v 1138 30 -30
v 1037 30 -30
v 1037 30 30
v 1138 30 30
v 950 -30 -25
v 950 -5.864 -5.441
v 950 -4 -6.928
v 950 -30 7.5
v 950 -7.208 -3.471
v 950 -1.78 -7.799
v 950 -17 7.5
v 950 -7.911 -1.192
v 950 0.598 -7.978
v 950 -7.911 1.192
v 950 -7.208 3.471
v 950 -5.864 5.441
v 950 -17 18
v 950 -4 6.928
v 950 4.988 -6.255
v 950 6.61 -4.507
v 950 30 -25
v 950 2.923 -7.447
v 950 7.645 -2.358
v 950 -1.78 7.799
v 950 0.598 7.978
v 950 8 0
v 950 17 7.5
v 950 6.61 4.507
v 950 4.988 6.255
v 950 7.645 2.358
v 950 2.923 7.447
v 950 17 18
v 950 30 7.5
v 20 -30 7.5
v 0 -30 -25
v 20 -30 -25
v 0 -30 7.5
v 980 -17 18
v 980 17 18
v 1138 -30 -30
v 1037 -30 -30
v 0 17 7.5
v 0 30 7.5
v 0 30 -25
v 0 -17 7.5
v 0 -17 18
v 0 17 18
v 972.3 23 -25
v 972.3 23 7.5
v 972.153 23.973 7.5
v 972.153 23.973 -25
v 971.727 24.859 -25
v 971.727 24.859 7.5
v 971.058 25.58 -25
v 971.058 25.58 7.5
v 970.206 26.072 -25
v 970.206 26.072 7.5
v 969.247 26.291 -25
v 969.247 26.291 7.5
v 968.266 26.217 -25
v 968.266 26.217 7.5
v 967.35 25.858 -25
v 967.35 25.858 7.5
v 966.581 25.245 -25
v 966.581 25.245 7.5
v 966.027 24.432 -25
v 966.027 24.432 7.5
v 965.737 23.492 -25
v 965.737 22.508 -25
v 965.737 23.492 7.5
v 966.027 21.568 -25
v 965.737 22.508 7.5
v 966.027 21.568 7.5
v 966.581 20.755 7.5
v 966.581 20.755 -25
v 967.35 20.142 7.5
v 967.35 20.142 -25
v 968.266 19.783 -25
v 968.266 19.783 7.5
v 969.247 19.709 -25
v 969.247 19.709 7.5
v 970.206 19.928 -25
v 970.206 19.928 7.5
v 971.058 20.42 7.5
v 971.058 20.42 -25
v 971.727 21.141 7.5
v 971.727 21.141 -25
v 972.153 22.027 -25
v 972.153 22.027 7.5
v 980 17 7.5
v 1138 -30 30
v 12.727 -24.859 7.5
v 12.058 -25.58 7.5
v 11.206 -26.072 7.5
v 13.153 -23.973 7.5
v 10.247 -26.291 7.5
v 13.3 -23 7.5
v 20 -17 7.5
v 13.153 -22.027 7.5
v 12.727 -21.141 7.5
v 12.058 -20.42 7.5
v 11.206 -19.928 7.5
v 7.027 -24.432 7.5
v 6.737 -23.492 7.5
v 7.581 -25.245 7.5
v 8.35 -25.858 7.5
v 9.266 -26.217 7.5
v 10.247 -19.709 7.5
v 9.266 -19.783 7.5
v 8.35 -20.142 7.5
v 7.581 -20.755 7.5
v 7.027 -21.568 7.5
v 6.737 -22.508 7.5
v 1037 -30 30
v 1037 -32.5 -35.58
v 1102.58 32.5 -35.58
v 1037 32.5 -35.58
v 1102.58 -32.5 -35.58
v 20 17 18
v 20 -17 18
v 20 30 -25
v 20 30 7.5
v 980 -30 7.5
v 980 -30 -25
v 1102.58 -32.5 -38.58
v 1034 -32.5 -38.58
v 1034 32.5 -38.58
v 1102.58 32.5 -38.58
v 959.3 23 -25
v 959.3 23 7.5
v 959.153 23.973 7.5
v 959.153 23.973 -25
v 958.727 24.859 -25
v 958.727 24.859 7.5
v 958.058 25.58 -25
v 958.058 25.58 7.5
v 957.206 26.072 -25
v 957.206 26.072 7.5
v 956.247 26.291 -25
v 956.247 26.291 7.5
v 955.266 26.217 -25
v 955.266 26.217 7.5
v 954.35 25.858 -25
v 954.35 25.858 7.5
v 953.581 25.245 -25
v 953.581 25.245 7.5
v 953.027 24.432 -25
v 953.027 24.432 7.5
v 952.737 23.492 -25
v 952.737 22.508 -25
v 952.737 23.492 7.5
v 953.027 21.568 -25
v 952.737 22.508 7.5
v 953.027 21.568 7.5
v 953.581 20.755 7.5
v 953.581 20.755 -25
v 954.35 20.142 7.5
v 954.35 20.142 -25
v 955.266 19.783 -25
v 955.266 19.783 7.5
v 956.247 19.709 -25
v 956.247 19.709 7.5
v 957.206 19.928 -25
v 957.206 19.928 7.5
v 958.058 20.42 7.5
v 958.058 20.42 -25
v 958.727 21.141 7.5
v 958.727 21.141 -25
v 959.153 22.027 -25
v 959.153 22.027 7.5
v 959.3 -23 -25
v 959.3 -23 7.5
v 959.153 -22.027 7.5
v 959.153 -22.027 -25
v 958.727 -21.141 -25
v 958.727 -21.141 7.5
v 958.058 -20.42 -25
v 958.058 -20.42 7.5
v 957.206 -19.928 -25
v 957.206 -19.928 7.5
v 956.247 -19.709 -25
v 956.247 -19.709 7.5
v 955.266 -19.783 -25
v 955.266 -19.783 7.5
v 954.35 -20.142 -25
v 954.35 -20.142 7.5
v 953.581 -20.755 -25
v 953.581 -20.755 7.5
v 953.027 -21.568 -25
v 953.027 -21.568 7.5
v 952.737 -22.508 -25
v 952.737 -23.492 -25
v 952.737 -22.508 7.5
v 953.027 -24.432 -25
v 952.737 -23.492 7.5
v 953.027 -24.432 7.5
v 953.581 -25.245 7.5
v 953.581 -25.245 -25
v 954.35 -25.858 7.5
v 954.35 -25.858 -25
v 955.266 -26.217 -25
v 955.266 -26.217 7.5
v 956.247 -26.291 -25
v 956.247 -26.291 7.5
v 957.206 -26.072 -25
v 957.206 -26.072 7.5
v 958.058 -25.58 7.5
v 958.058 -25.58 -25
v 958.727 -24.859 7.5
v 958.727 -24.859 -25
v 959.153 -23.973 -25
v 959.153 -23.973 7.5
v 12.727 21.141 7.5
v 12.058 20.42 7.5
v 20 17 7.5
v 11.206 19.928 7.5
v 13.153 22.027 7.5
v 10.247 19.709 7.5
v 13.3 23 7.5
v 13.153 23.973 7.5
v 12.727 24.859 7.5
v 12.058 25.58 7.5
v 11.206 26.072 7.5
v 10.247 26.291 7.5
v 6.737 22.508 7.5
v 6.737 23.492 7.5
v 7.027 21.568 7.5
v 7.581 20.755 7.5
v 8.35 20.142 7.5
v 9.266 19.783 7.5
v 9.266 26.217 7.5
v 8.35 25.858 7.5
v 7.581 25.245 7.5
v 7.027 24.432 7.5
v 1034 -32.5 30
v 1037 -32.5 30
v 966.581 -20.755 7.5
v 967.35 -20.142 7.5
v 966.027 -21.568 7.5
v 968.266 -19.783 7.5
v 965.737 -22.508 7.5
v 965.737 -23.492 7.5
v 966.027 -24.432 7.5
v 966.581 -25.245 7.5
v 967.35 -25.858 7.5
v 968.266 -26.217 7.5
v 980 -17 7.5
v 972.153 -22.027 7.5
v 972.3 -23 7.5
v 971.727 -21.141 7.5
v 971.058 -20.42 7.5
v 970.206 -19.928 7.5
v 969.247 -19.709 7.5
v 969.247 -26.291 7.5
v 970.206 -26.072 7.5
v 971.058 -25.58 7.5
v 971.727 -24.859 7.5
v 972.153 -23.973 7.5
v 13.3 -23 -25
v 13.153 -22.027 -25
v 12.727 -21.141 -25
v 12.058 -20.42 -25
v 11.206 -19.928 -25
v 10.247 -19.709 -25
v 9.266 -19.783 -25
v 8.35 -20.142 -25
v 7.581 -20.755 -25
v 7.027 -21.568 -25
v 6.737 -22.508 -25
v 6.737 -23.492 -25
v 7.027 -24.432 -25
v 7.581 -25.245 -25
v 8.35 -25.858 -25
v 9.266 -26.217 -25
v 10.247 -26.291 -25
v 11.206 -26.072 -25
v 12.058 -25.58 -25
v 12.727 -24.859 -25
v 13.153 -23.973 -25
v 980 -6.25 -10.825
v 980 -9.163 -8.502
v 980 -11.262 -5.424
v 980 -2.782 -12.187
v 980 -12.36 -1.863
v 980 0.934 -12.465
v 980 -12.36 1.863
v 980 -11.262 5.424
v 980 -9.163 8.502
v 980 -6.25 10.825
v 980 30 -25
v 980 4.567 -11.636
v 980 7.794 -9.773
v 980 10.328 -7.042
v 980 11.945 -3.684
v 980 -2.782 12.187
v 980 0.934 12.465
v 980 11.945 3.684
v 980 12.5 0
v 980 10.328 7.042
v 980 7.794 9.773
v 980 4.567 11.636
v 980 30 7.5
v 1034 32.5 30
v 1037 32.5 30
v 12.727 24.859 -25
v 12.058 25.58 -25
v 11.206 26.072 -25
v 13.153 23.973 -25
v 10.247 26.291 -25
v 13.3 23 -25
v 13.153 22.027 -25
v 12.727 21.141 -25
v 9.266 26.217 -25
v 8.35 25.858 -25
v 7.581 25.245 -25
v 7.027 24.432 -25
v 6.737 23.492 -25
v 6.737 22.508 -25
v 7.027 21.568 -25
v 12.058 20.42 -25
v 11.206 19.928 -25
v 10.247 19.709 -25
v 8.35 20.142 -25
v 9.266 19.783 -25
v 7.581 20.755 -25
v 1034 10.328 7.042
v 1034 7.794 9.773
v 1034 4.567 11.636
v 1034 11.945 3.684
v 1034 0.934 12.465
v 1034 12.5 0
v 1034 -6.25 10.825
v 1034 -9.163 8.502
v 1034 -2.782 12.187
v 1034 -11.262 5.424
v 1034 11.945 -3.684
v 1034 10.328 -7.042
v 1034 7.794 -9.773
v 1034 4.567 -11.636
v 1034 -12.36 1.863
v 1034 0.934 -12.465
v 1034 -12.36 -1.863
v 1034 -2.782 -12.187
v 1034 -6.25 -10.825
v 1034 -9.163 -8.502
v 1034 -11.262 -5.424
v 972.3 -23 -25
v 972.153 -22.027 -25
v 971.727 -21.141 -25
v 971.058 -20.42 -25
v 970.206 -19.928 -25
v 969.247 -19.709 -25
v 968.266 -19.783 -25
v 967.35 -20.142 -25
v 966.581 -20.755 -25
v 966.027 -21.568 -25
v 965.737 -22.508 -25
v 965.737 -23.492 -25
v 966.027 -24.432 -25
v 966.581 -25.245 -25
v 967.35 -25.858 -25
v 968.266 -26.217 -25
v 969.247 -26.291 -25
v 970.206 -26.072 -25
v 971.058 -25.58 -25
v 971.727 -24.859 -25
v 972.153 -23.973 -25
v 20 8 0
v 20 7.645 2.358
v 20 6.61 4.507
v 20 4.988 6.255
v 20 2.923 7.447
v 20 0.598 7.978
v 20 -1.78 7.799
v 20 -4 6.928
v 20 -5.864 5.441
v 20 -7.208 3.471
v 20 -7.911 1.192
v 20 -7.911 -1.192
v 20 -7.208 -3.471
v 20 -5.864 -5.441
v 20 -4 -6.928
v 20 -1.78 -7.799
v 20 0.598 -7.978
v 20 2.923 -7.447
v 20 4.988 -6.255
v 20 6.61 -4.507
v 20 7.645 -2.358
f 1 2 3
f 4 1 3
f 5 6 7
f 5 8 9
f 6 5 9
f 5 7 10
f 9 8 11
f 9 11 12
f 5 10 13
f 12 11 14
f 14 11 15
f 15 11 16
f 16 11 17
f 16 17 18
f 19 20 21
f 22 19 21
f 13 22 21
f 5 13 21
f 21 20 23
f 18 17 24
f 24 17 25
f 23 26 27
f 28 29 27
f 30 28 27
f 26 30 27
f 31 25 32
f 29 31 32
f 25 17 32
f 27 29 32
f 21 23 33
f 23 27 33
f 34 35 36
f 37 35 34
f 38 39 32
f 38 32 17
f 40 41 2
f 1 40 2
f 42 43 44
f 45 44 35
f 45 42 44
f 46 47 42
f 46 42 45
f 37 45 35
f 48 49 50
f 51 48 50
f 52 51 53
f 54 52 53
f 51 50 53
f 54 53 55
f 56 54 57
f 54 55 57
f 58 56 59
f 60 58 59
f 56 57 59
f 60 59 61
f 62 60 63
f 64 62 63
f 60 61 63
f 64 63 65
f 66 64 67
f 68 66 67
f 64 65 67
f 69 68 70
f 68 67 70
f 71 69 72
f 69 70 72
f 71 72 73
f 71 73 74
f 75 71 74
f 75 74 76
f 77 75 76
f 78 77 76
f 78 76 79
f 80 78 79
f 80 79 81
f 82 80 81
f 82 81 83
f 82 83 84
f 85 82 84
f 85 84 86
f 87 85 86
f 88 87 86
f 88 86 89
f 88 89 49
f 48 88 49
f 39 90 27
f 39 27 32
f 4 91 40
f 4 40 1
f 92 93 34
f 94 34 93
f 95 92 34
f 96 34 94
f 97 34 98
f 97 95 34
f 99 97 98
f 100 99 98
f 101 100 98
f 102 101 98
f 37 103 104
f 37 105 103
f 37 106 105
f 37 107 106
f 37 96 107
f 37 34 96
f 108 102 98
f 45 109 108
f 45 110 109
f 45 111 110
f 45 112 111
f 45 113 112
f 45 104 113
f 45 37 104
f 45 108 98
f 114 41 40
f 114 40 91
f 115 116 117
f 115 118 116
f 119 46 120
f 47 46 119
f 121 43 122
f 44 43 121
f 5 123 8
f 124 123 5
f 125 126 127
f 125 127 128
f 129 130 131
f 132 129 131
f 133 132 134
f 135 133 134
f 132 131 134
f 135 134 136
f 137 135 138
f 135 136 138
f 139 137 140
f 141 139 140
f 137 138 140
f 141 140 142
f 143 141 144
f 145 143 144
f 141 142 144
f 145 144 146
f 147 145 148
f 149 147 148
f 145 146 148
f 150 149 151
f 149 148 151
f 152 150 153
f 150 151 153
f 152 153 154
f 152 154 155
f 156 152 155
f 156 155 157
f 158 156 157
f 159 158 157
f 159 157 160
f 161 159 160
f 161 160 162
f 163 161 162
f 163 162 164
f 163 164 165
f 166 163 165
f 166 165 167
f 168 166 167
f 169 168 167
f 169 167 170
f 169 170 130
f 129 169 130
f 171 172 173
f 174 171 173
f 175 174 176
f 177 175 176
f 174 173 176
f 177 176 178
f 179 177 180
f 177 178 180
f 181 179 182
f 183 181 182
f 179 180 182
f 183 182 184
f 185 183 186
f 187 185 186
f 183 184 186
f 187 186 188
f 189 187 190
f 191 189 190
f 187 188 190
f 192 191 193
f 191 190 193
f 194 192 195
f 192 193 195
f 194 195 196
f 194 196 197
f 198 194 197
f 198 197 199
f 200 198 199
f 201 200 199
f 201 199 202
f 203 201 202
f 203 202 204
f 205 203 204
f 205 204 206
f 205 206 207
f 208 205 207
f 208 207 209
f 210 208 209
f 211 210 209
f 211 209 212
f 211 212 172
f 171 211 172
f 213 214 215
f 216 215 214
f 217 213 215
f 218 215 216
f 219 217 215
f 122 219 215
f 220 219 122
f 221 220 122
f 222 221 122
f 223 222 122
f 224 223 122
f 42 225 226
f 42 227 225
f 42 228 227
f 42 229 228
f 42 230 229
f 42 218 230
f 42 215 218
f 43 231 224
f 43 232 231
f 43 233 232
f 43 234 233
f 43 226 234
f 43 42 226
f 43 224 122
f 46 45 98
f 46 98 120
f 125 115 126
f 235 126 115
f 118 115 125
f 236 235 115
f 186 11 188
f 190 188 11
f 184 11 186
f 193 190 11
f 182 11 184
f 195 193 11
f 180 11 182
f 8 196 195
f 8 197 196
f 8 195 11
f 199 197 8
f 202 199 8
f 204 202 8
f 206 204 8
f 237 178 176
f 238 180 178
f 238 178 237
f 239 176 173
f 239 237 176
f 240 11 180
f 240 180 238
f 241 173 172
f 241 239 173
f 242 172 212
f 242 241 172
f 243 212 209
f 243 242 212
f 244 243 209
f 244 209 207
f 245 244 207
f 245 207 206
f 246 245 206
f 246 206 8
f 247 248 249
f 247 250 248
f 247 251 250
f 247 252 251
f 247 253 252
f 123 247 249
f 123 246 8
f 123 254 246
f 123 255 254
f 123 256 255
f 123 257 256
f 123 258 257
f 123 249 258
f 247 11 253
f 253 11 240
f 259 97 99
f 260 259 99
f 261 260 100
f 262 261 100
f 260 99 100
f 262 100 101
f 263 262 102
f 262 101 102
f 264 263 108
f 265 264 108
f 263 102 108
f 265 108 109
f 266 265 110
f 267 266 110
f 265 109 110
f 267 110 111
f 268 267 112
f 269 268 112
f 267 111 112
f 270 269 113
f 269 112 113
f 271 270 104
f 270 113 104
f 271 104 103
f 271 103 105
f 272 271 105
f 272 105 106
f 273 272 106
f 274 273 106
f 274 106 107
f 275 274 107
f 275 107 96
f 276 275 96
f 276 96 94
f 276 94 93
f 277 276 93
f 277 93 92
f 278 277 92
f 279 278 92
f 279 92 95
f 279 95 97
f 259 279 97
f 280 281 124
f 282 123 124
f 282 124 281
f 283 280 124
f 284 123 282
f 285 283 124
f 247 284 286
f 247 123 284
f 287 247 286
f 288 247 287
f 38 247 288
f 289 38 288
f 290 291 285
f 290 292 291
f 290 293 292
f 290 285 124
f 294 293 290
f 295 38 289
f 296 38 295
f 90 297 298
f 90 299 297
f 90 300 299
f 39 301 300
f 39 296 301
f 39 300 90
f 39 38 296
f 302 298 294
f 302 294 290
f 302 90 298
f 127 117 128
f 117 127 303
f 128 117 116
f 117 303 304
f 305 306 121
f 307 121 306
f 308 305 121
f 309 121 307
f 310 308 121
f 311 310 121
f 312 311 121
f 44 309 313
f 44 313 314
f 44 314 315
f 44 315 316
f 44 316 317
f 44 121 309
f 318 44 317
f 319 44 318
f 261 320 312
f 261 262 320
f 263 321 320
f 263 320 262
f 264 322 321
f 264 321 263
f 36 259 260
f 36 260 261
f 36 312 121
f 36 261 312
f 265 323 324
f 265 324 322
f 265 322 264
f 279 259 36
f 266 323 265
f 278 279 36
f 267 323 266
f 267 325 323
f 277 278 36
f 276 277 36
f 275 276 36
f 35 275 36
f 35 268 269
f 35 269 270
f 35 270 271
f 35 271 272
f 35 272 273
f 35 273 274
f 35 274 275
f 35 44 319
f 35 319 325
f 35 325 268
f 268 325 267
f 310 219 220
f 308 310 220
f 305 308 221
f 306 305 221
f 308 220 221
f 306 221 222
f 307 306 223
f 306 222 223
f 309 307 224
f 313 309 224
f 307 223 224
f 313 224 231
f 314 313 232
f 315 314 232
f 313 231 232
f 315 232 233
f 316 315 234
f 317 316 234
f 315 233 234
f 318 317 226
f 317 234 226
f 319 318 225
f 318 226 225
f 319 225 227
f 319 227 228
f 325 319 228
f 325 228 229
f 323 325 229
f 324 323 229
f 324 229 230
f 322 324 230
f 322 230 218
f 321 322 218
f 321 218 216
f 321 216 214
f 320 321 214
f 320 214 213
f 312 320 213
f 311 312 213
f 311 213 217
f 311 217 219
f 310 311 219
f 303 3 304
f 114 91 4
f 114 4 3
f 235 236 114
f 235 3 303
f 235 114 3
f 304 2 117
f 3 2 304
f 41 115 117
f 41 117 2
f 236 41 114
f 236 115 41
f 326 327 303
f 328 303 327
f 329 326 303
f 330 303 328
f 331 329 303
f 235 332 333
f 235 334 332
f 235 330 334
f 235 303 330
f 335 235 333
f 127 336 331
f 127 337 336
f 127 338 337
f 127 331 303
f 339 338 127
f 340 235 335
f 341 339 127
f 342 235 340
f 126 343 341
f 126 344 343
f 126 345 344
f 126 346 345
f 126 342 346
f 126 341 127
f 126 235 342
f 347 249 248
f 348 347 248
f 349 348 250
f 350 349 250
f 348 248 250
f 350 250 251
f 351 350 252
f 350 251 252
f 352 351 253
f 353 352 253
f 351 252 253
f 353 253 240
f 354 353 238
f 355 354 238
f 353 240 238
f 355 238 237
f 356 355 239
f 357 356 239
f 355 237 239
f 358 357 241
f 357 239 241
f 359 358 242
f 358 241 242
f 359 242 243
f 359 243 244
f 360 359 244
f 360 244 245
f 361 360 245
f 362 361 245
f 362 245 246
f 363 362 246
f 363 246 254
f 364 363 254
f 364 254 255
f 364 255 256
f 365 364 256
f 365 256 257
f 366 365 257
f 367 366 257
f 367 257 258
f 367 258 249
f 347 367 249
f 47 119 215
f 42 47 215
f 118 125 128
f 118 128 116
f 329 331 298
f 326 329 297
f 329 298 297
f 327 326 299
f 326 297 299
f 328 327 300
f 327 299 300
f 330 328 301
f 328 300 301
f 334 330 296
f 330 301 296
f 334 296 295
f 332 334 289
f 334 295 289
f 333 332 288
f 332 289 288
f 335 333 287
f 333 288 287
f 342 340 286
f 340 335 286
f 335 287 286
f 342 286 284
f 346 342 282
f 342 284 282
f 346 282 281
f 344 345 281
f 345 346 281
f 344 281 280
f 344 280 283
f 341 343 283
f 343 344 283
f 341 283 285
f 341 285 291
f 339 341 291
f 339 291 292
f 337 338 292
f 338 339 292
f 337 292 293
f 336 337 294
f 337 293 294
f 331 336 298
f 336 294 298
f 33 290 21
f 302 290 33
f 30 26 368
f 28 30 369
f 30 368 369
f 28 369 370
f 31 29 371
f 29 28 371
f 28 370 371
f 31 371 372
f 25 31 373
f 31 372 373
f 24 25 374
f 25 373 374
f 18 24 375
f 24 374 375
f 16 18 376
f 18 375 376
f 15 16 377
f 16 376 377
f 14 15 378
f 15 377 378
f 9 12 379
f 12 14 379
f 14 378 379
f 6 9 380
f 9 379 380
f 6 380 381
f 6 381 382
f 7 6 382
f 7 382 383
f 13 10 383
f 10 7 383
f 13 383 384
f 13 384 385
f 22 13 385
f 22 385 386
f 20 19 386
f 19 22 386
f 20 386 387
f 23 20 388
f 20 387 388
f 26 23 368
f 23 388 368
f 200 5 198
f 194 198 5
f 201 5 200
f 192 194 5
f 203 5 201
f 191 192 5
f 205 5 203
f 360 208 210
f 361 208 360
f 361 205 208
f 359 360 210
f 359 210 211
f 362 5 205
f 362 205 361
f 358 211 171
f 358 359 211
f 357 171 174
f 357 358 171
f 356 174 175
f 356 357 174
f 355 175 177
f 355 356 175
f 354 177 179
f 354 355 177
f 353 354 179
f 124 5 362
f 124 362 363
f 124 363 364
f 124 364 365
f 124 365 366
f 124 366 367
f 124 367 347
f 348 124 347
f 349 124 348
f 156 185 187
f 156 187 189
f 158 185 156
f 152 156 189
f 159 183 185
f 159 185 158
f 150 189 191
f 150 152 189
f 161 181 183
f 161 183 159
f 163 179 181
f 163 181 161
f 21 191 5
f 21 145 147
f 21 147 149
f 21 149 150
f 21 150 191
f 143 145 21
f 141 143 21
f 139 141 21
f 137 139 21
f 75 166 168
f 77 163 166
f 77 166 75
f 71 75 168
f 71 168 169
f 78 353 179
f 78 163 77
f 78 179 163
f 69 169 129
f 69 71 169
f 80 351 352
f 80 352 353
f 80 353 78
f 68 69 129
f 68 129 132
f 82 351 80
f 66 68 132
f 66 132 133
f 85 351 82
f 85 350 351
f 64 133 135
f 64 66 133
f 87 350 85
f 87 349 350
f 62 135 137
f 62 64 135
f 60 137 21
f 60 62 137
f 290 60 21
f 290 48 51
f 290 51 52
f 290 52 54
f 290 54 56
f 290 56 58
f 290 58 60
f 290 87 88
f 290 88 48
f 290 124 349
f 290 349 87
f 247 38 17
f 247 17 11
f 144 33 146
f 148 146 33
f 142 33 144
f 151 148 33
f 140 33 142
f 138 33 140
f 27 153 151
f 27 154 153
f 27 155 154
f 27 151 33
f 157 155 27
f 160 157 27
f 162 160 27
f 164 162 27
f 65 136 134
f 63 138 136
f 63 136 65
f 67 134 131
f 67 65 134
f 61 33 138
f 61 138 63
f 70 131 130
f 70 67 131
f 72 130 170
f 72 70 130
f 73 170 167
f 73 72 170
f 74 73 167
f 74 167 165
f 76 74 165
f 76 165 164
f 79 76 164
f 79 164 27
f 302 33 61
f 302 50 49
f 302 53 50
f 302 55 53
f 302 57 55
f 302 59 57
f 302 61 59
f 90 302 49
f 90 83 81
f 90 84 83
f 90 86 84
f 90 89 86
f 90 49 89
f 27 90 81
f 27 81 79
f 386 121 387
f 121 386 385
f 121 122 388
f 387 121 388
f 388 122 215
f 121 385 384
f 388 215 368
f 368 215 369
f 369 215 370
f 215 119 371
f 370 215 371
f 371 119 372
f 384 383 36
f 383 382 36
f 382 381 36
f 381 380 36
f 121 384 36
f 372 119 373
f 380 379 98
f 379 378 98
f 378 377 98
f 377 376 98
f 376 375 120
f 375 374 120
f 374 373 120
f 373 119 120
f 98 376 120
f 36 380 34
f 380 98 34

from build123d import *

# Parameters (mm, degrees)
F0_R      = 8
F1_DEPTH  = 980
F3_DEPTH  = 30
F5_DEPTH  = 20
F6_R      = 12.5
F7_DEPTH  = 57
F8_R      = 3.3
F9_DEPTH  = 43.001
F10_W     = 60
F10_H     = 60
F11_DEPTH = 101
F13_DEPTH = 32.5


# Not quite as in the source:
# - a feature names something its author has since deleted; it is built from what else it names


with BuildPart() as f1:
    # F0 (on Right) → F1 (new body)
    with BuildSketch(Plane.YZ):
        Circle(F0_R)
    extrude(amount=F1_DEPTH)

    # F2 (on face) → F3 (join)
    with BuildSketch(Plane.YZ.offset(980)):
        Polygon((30, 7.5), (17, 7.5), (17, 18), (-17, 18), (-17, 7.5), (-30, 7.5), (-30, -25), (30, -25), align=None)
    extrude(amount=-F3_DEPTH)

    # F4 (on face) → F5 (join)
    with BuildSketch(Plane(origin=(0, 0, 0), x_dir=(0, -1, 0), z_dir=(-1, 0, 0))):
        Polygon((17, 7.5), (17, 18), (-17, 18), (-17, 7.5), (-30, 7.5), (-30, -25), (30, -25), (30, 7.5), align=None)
    extrude(amount=-F5_DEPTH)

    # F6 (on face) → F7 (join)
    with BuildSketch(Plane.YZ.offset(980)):
        Circle(F6_R)
    extrude(amount=F7_DEPTH)

    # F8 (on face) → F9 (cut, through all)
    with BuildSketch(Plane.XY.offset(18)):
        with Locations((956, 23)):
            Circle(F8_R)
        with Locations((969, 23)):
            Circle(F8_R)
        with Locations((956, -23)):
            Circle(F8_R)
        with Locations((969, -23)):
            Circle(F8_R)
        with Locations((10, 23)):
            Circle(F8_R)
        with Locations((10, -23)):
            Circle(F8_R)
    extrude(amount=-F9_DEPTH, mode=Mode.SUBTRACT)

    # F10 (on face) → F11 (join)
    with BuildSketch(Plane.YZ.offset(1037)):
        Rectangle(F10_W, F10_H)
    extrude(amount=F11_DEPTH)

    # F12 (on Front) → F13 (join, symmetric)
    with BuildSketch(Plane.XZ):
        Polygon((1037, 30), (1034, 30), (1034, -38.58), (1102.58, -38.58), (1102.58, -35.58), (1037, -35.58), align=None)
    extrude(amount=F13_DEPTH, both=True)


solid = f1.part
